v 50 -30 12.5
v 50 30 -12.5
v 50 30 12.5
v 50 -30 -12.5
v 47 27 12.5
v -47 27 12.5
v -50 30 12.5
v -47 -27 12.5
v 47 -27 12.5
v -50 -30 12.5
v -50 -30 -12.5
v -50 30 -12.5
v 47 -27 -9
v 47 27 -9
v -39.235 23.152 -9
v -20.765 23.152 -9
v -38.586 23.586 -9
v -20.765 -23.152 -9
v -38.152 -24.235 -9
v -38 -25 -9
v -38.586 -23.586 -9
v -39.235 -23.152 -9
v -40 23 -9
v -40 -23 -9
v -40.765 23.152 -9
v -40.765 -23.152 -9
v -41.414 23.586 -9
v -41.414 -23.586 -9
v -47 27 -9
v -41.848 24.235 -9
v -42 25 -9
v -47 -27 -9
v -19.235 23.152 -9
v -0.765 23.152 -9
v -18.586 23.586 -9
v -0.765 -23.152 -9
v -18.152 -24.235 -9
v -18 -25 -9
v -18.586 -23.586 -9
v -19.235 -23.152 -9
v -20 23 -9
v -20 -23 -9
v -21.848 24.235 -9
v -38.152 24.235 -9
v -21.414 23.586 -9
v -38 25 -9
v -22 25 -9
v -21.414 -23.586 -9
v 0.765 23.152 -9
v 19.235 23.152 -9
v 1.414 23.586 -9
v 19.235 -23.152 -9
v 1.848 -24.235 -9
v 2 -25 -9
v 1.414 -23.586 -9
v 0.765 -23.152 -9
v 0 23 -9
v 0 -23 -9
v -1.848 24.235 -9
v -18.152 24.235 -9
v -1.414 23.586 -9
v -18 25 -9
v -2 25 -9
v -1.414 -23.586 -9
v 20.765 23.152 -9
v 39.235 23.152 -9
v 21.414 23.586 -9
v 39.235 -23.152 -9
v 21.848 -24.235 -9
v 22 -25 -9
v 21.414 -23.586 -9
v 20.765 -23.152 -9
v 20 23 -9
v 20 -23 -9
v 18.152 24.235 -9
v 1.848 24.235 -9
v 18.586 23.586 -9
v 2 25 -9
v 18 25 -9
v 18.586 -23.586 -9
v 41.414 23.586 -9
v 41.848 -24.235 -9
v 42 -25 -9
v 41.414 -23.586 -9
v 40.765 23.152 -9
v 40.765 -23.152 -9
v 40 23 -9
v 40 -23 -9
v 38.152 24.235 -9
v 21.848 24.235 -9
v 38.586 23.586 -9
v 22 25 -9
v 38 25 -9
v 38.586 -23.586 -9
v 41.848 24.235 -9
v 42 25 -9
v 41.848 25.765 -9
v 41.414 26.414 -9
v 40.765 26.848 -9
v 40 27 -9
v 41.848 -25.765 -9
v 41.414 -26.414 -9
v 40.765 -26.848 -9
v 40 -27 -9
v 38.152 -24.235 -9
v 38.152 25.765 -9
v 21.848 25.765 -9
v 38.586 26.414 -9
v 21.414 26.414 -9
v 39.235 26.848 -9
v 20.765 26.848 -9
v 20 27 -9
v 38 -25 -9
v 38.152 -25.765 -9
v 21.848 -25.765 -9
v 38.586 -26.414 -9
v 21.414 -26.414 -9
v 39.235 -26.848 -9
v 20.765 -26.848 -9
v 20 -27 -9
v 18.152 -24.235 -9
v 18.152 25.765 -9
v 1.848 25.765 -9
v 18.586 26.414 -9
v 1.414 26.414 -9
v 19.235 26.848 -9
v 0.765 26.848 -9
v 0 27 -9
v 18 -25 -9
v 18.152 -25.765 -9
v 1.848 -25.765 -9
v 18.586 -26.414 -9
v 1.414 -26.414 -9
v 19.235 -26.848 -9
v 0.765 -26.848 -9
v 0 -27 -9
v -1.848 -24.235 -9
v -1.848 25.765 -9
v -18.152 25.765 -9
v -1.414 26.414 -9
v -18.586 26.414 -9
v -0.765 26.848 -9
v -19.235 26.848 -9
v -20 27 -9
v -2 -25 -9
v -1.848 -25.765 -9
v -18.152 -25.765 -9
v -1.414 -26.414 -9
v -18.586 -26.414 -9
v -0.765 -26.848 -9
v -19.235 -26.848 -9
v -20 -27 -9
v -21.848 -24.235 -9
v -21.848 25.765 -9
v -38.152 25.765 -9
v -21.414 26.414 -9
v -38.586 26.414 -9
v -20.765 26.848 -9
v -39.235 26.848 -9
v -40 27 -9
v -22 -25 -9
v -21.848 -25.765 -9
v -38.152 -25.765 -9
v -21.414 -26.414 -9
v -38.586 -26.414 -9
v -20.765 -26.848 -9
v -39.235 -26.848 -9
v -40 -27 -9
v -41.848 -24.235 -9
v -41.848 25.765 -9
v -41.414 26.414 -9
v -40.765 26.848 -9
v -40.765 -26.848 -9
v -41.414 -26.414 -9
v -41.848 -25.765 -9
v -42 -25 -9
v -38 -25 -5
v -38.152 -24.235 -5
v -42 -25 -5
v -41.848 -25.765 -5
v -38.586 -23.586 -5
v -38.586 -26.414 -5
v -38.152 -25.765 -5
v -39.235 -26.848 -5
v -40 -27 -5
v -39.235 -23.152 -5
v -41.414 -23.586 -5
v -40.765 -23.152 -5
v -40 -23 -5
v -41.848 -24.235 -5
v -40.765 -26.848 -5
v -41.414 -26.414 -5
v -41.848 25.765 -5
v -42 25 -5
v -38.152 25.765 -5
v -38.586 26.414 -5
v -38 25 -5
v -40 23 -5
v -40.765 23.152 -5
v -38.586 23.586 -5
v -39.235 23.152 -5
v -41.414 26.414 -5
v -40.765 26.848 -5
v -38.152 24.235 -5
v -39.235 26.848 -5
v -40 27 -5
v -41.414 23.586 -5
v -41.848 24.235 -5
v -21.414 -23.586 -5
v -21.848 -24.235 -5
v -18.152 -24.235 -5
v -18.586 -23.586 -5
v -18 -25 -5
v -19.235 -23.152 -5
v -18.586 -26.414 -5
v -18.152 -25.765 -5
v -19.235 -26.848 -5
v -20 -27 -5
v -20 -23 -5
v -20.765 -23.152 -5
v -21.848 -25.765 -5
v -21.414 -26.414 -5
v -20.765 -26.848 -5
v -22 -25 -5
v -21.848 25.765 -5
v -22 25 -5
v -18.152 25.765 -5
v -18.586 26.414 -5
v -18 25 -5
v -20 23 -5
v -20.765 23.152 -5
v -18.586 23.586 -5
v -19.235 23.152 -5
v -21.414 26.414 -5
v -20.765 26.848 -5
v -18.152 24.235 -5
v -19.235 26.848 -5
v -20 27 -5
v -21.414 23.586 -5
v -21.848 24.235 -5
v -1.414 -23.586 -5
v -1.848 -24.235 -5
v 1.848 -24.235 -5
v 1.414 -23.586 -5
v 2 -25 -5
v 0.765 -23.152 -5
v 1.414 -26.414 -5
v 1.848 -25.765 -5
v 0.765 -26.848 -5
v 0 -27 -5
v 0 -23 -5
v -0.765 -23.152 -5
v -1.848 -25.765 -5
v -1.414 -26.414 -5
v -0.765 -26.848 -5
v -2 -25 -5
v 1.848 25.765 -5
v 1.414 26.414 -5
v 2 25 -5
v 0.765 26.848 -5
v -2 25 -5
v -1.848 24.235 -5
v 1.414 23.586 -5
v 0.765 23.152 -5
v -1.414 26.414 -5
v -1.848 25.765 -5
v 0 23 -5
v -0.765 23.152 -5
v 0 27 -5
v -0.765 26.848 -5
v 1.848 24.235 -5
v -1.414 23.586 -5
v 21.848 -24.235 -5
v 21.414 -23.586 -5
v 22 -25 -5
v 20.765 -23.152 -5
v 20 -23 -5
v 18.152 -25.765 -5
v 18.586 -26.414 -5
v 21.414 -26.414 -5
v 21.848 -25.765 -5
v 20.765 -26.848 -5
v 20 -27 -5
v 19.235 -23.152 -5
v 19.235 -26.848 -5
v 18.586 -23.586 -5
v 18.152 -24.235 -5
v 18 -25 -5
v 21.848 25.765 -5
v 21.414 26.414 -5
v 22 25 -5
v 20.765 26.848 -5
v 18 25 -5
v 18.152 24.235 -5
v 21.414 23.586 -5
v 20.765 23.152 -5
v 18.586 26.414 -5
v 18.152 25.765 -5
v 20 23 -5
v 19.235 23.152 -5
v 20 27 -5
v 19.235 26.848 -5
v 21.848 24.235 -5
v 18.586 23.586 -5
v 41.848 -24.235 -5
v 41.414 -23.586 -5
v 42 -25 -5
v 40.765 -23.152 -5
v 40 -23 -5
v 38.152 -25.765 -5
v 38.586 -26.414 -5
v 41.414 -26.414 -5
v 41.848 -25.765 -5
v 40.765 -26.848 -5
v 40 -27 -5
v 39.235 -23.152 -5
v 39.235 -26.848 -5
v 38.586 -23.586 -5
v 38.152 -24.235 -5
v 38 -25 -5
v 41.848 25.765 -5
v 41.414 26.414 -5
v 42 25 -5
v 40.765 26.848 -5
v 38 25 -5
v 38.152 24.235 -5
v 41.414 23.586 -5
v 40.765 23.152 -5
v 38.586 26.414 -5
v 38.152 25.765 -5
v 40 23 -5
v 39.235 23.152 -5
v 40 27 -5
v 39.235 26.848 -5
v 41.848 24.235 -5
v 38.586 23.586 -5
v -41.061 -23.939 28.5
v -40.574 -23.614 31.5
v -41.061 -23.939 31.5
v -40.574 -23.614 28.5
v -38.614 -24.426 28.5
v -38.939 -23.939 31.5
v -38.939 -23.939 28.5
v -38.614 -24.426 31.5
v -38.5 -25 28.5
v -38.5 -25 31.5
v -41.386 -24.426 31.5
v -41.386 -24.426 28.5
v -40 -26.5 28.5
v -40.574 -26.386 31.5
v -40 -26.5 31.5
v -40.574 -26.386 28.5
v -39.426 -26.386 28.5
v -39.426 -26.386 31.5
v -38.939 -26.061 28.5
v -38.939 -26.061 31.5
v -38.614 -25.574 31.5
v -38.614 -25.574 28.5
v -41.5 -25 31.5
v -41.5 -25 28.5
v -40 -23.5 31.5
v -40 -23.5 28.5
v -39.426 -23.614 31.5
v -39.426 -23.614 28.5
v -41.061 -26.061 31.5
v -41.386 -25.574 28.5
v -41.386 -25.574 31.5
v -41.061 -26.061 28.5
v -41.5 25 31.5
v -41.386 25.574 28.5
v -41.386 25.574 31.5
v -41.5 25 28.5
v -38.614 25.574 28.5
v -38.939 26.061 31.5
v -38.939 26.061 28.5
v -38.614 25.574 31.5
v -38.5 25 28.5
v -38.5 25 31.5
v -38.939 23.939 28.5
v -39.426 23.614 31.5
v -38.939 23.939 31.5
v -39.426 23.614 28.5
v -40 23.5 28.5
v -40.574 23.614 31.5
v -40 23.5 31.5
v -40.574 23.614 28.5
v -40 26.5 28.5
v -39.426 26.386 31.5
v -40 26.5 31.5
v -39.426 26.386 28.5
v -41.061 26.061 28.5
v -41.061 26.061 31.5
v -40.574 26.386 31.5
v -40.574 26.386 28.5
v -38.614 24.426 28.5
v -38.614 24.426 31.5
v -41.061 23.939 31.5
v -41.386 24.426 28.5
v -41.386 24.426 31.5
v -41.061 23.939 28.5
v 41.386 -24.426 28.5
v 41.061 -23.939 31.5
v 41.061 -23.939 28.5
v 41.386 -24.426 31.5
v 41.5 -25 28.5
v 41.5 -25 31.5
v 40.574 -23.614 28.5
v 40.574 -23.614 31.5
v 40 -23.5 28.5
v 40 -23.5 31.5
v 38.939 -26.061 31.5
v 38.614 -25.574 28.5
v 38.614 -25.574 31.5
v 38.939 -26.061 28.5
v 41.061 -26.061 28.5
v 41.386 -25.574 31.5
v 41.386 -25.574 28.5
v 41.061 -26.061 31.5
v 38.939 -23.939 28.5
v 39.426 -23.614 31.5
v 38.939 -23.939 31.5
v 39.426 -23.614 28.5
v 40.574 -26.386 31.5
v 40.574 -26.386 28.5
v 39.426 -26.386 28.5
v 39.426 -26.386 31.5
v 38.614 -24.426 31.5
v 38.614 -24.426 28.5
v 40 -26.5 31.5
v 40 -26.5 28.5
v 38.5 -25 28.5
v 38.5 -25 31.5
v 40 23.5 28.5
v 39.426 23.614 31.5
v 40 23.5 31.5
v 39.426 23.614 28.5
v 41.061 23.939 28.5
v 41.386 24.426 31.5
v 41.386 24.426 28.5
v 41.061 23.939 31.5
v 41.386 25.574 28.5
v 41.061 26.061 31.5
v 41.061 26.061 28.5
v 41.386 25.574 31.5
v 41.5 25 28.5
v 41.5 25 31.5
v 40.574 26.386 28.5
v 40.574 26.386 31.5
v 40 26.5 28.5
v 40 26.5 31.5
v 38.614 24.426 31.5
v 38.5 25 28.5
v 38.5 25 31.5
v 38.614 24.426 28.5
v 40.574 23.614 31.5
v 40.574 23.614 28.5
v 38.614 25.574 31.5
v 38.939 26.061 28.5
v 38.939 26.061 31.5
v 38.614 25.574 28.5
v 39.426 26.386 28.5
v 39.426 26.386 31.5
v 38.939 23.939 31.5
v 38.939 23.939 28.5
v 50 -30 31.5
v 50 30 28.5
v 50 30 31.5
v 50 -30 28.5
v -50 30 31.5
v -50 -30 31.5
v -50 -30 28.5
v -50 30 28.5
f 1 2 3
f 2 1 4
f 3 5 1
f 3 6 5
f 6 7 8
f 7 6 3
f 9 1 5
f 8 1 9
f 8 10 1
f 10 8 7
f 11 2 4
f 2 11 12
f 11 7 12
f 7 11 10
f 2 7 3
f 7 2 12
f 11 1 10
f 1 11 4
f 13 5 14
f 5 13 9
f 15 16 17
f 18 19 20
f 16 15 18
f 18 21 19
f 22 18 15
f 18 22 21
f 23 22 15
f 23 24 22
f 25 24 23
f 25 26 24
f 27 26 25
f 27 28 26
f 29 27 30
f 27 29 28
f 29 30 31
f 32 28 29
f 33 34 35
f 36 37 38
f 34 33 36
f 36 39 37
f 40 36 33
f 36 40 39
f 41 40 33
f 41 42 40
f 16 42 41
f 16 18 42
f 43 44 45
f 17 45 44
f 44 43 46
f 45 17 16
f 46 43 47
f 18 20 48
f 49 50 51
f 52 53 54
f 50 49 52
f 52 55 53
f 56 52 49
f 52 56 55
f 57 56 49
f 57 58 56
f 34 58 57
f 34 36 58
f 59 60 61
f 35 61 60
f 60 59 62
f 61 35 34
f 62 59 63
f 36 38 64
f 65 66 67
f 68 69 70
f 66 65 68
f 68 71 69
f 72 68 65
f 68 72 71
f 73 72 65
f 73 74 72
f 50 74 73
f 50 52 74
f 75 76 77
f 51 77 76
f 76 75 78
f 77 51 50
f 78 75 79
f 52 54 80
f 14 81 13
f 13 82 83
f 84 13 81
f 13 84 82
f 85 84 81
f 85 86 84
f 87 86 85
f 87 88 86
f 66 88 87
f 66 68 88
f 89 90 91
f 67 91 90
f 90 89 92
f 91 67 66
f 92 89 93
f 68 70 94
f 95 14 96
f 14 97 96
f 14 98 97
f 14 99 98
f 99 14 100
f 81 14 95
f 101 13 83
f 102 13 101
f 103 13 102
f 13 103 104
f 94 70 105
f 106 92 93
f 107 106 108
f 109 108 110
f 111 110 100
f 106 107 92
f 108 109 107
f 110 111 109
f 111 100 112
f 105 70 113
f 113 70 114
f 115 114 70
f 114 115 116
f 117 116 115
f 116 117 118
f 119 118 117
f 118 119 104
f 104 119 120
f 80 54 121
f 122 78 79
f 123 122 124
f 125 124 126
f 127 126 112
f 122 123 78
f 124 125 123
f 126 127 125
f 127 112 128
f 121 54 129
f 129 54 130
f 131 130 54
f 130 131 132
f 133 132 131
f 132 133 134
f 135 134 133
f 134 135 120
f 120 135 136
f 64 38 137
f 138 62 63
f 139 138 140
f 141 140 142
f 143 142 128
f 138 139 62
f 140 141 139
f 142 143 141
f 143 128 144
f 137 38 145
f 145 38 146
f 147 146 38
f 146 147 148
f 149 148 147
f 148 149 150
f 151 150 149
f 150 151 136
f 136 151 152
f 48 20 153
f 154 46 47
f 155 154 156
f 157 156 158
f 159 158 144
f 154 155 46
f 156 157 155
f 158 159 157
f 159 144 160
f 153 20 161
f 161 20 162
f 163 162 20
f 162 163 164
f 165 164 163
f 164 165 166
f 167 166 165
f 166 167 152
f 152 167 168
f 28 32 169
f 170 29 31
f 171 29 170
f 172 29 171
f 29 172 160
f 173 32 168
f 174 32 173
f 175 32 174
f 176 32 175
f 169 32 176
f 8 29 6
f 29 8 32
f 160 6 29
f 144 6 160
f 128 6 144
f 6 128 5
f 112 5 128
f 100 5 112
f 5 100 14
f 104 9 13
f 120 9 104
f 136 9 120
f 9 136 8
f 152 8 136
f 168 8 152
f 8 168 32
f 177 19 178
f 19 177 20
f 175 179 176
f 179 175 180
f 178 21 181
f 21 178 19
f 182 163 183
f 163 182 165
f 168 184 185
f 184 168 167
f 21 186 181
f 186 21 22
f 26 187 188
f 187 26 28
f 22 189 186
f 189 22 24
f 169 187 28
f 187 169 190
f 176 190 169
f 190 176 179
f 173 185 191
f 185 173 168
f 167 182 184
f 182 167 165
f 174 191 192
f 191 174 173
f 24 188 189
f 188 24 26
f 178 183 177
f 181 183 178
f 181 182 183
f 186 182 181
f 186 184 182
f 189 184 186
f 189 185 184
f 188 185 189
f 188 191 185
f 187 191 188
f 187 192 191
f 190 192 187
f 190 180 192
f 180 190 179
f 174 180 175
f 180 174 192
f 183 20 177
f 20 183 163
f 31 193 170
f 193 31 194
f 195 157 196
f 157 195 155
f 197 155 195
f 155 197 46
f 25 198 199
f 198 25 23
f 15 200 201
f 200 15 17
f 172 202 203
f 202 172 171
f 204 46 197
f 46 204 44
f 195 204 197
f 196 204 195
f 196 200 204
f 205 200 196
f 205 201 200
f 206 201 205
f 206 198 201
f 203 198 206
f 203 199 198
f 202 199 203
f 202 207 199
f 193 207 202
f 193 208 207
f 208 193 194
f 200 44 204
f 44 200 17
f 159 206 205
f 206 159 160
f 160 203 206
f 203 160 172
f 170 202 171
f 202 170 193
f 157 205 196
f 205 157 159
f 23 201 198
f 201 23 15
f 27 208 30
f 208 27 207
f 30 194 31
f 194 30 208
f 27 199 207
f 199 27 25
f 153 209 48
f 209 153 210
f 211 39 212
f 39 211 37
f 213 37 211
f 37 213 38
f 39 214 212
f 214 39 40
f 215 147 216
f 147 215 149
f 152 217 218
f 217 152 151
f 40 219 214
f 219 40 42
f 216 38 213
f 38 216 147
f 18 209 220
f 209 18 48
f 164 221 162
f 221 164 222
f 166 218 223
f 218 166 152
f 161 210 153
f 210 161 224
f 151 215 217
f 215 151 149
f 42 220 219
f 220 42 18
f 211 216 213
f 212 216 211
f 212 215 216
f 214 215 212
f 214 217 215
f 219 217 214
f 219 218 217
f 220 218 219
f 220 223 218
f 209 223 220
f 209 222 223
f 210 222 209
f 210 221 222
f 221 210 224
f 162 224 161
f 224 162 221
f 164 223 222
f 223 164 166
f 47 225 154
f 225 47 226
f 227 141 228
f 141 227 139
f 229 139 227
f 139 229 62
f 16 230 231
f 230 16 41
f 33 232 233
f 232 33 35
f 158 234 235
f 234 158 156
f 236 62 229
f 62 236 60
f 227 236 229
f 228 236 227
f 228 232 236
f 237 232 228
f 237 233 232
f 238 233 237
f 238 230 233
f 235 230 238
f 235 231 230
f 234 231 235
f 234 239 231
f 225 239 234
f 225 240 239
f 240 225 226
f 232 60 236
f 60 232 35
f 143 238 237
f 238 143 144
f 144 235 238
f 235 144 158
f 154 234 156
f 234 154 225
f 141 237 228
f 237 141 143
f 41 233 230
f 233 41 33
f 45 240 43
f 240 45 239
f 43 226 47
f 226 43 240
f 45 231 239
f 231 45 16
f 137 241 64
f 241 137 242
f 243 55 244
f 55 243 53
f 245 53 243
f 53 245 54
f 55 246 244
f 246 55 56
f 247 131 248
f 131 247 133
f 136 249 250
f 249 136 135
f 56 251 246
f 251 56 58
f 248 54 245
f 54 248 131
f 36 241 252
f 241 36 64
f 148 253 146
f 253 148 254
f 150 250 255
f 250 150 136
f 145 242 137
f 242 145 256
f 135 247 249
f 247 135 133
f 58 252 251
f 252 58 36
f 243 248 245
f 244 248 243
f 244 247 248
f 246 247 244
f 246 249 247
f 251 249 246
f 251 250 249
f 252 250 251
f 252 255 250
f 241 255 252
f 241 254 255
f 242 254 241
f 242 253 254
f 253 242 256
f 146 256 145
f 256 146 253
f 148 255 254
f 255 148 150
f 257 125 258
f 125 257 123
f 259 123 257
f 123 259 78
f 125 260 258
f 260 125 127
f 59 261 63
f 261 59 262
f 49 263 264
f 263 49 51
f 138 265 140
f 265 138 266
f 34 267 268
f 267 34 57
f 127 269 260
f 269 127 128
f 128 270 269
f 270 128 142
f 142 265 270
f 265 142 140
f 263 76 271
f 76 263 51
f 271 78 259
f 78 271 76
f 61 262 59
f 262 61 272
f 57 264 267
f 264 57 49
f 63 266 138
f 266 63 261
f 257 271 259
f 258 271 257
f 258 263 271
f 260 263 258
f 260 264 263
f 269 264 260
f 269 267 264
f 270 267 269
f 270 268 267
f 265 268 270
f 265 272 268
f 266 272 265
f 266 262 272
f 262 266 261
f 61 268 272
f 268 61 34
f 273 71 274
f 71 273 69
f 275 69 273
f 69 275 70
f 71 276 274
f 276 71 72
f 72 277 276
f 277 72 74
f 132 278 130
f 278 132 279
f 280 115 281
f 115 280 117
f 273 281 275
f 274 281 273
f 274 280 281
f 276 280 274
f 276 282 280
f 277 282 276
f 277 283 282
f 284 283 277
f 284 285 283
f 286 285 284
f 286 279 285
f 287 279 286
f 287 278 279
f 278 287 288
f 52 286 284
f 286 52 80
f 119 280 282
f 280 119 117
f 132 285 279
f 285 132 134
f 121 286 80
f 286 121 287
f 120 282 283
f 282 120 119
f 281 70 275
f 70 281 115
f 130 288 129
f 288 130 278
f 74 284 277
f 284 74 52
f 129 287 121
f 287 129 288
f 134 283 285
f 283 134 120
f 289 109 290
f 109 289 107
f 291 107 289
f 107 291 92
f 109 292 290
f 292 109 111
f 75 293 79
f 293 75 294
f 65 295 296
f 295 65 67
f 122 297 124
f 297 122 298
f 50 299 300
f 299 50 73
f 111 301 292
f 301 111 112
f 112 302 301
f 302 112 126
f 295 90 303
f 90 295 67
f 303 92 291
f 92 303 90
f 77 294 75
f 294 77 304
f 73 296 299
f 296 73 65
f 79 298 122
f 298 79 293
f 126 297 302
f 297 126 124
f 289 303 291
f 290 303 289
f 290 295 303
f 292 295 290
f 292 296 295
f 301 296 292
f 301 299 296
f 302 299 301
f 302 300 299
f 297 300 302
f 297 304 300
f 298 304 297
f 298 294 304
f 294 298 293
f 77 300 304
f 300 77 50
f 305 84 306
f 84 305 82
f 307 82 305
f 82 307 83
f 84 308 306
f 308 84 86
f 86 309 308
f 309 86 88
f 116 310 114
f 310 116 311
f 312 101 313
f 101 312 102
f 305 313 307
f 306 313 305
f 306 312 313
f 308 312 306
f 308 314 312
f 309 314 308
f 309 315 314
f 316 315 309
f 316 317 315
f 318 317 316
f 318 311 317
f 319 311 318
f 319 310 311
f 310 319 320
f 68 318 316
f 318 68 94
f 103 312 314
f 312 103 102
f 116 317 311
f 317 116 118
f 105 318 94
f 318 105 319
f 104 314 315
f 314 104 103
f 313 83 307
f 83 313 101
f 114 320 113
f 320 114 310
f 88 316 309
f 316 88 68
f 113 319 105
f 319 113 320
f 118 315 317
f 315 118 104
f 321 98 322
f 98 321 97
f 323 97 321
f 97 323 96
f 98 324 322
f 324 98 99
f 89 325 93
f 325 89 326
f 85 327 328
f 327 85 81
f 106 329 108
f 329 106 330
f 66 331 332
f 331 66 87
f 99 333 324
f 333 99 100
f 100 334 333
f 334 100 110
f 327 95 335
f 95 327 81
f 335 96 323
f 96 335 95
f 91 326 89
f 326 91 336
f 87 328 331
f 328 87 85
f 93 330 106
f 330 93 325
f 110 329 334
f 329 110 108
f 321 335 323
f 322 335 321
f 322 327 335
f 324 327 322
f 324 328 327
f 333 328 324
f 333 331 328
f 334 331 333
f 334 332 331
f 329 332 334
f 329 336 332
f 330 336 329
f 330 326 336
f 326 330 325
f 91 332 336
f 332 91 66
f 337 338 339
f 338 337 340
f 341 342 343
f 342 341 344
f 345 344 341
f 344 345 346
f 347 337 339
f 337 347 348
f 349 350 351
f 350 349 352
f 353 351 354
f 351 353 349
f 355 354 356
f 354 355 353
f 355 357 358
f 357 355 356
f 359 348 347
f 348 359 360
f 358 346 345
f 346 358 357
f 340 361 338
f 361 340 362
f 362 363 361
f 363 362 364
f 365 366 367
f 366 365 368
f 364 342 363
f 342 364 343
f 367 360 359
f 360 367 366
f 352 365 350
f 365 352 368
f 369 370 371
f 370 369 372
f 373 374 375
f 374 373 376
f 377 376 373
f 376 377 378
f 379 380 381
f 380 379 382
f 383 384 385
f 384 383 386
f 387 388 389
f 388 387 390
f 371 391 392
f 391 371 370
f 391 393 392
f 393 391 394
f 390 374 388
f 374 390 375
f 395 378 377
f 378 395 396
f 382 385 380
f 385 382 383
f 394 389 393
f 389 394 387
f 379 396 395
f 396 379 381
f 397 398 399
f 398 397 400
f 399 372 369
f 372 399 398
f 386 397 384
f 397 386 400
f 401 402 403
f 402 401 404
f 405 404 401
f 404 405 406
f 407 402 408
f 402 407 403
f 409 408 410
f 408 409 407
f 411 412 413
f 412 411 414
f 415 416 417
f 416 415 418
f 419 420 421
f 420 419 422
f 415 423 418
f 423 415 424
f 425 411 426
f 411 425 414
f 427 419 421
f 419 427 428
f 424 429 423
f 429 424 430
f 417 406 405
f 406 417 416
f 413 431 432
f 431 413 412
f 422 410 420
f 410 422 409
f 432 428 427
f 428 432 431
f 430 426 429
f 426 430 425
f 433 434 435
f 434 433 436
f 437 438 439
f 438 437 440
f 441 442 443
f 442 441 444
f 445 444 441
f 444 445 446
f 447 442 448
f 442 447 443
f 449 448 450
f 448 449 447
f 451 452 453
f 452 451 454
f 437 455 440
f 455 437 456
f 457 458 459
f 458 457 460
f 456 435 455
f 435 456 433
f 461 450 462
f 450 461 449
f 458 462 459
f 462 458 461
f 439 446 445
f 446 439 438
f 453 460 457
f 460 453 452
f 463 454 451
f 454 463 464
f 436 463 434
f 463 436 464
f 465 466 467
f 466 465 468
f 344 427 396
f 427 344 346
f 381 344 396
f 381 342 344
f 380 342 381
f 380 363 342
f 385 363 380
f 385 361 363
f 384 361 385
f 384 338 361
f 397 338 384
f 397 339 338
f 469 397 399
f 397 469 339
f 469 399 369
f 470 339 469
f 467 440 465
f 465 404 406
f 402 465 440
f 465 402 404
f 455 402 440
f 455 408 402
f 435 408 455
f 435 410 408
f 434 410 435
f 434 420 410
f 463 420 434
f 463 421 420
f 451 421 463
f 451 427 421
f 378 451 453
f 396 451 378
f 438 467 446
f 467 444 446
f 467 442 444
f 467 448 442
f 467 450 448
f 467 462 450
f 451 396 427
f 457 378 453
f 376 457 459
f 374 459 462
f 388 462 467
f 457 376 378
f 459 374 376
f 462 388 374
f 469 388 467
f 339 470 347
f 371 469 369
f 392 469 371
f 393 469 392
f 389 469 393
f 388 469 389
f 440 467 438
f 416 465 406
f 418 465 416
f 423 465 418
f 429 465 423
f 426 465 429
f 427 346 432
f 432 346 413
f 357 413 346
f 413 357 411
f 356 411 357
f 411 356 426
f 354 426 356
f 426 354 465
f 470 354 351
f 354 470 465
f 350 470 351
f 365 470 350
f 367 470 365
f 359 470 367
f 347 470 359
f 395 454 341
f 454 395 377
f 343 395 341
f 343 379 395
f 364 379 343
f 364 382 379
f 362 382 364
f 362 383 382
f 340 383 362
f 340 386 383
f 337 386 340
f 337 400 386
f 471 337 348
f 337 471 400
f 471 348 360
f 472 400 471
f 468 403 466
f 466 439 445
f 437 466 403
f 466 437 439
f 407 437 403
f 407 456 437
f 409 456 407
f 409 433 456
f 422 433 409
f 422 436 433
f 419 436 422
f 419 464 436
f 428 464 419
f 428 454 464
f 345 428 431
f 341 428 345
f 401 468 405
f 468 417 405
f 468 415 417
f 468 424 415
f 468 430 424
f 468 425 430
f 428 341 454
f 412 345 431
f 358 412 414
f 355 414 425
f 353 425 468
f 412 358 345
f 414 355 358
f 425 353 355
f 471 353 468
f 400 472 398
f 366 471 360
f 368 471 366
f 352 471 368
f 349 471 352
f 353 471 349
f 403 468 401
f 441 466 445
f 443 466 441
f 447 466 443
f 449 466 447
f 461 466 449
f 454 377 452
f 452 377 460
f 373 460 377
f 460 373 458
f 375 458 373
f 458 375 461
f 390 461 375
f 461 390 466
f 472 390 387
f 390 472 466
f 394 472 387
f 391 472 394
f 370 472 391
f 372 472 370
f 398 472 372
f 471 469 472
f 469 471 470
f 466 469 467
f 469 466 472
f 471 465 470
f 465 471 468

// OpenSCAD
// LAMP-DNK-Ekspress Lot 2.10
module body() { difference() { cube([100,60,25],center=true); translate([0,0,2]) cube([94,54,22],center=true); } }
module mounts() { for(x=[-40,-20,0,20,40]) { translate([x,-25,-10]) cylinder(h=5,r=2,$fn=16); translate([x,25,-10]) cylinder(h=5,r=2,$fn=16); } }
module lid() { translate([0,0,30]) difference() { cube([100,60,3],center=true); for(x=[-40,40]) for(y=[-25,25]) translate([x,y,0]) cylinder(h=5,r=1.5,center=true,$fn=16); } }
color("SteelBlue") body(); color("Gold") mounts(); color("LightBlue",0.7) lid();
